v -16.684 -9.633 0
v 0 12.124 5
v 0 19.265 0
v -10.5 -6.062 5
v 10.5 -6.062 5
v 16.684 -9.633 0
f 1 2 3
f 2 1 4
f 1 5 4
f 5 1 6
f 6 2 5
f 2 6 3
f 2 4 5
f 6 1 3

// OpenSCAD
// file: dice_mold_base_generator.scad
module triangle_centered_at_incenter(s=13.76, h=0) {
    b = s / sqrt(2);
    points = [for (i = [90, 90 + 120, 90-120]) [cos(i) * b, sin(i) * b]];
    polygon(points);
}



module polygon_centered_at_incenter(s=13.76, n=3, h=5, slope=30) {
    incenter_angle = 360 / n;
    end = n - 1;
    angles = [for (i = [0:end]) (90 + incenter_angle * i)];
    angles_sum = 180 + (n - 3) * 180;
    vertex_angle = angles_sum / n;
    r = 0.5 * s / cos(vertex_angle / 2);
    points = [for (i = angles) [cos(i) * r, sin(i) * r]];
    bigger_r = r + (cos(slope) * (h / sin(slope)));
    bigger_points = [for (i = angles) [cos(i) * bigger_r, sin(i) * bigger_r]];
        
//    polygon(points);
    
//    polygon(bigger_points);
    
    points3d = [for (i = [0:end]) [points[i][0], points[i][1], h]];
    bigger_points3d = [for (i = [0:end]) [bigger_points[i][0], bigger_points[i][1], 0]];
    
    all_points = concat(points3d, bigger_points3d);
//    points = concat(points, [points[0]]);
//    bigger_points = concat(bigger_points, [bigger_points[0]]);
    
    num_points = len(points3d);
    faces = concat([for (i=[0:end]) [i, (i + 1) % n, num_points + (i + 1) % n, num_points + i]], [[for (i = [0:end]) num_points - 1 - i]], [[for (i = [0:end]) num_points + i ]]);
//    echo(points3d);
//    echo(bigger_points3d);
//    echo(all_points);
//    echo(faces);
        
    polyhedron(points=all_points, faces=faces);
}

module generate_d10(bottom_diff=3.8, diameter=17.37, height=29.03) {
    radius = 0.5 * diameter;
    center_angle = 36;
    angles1 = [for (i = [0:4]) (90 + center_angle * i * 2)];
    angles2 = [for (i = angles1) (i + center_angle)];
//    points = [for (i = [0
    points1 = [for (i = angles1) [cos(i) * radius, sin(i) * radius]];
    points2 = [for (i = angles2) [cos(i) * radius, sin(i) * radius]];
    
//    polygon(points1);
//    #polygon(points2);
    
    diff = bottom_diff * 0.5;
    points1_3d = [for (p = points1) [p[0], p[1], diff]];
    points2_3d = [for (p = points2) [p[0], p[1], -diff]];
    
    h2 = height * 0.5;
    top_point = [0, 0, h2];
    bottom_point = [0, 0, -h2];
    all_points = concat(points1_3d, points2_3d, [top_point], [bottom_point]);
    lall = len(all_points);
    t = lall - 2;
    b = lall - 1;
    
    plen = len(points1_3d);
    faces1 = [for (i = [0:plen - 1]) [t, i, plen + i, (i + 1) % plen]];
    faces2 = [for (i = [0:plen-1]) [b, plen + (i + 1) % plen, (i + 1) % plen, plen + i]];
    echo(faces1[2]);
    echo(all_points);
    
    polyhedron(points=all_points, faces=[for (i = [2:2]) faces1[i]]);
//    polyhedron(points=all_points, faces=concat(faces1, faces2));
}

function polar_x(r=5, theta=0) = cos(theta) * r;
function polar_y(r=5, theta=0) = sin(theta) * r;
function oval_x(r1, a, theta) = cos(theta) * (r1 + a * abs(cos(theta)));
function oval_y(r1, a, theta) = sin(theta) * (r1 + a * abs(cos(theta)));
module d10_base(s1=16, s2=6.5, l=18.4, h=5, slope=35) {
    p = (s1 + s2 + l) / 2;
    s3 = 2 * sqrt(p * (p - s1) * (p - s2) * (p - l)) / l;
    h1 = sqrt(s1 * s1 - s3 * s3);
    h2 = sqrt(s2 * s2 - s3 * s3);
    l_half = l / 2;
    above = l_half - h1;
//    diamond = [[0, l_half], [-s3, above], [0, -l_half], [s3, above]];
    
    base_diff = (cos(slope) * (h / sin(slope)));
    
    th1 = atan2(above, s3);
    th2 = atan2(above, -s3);
    small_r = sqrt(s3 * s3 + above * above);
    base_r = small_r + base_diff;
    top_r = l_half;
    angles = [90, th2, 270, th1];
    a_top = (small_r - top_r) / abs(cos(th1));
    base_small_r = sqrt(pow(cos(th2) * base_r, 2) + pow(sin(th2) * base_r, 2));
    a_bot = (base_small_r - (l_half + base_diff)) / abs(cos(th1));
    diamond = [for (t = angles) [oval_x(top_r, a_top, t), oval_y(top_r, a_top, t)]];
    base_points = [for (t = angles) [oval_x(base_r, a_bot, t), oval_y(base_r, a_bot, t)]];
//    polygon(points=diamond);
//    #polygon(points=diamond);
    
    
    
//    base_points = [[0, l_half + base_diff], [cos(th2) * base_r, sin(th2) * base_r], [0, -l_half - base_diff], [cos(th1) * base_r, sin(th1) * base_r]];
//    polygon(points=base_points);
//    base_points = [[0, l_half + base_diff], [-s3 - base_diff, above], [0, -l_half - base_diff], [s3 + base_diff, above]];
//    polygon(points=diamond);
    
    diamond_points3d = [for (i = diamond) [i[0], i[1], 5]];
    base_points3d = [for (i = base_points) [i[0], i[1], 0]];
    all_points = concat(diamond_points3d, base_points3d);
    
    faces = concat([for (i=[0:3]) [i, (i + 1)% 4, 4 + (i + 1)% 4, 4 + i]],
                   [[0, 3, 2, 1]],
                   [[4, 5, 6, 7]]);
    echo("Points", all_points);
    echo("Faces", faces);
    polyhedron(points=all_points, faces=faces); //[for (i=[0:3]) [i, (i + 1)% 4, 4 + (i + 1)% 4, 4 + i]]);
    
//    #polygon(points=base_points);
}


//intersection() {
//translate([0, 0, -5]) rotate([0, 0, 18]) cylinder(h=10, r1=10, r2=0, $fn=5);
//rotate([0, 0, 36 + 18]) translate([0, 0, 5]) rotate([180, 0, 0]) cylinder(h=10, r1=10, r2=0, $fn=5);
//}

////generate_d10(bottom_diff=3.8, diameter=25);

//polyhedron(points=[
//    [0, 12.5, 1.9], // 0
//    [-11.8882, 3.86271, 1.9], // 1
//    [-7.34732, -10.1127, 1.9], // 2
//    [7.34732, -10.1127, 1.9], // 3
//    [11.8882, 3.86271, 1.9], // 4
//    [-7.34732, 10.1127, -1.9], // 5
//    [-11.8882, -3.86271, -1.9], // 6
//    [0, -12.5, -1.9], // 7
//    [11.8882, -3.86271, -1.9], // 8
//    [7.34732, 10.1127, -1.9], // 9
//    [0, 0, 14.515], // 10
//    [0, 0, -14.515]], // 11
//    faces=[[10, 2, 7, 3]]);
//    

//polygon_centered_at_incenter(s=10, n=5, h=5);

// For D4
//translate([-50, 0, 0]) polygon_centered_at_incenter(s=21, n=3, h=5, slope=35);

// For D6
//translate([-30, 20, 0]) polygon_centered_at_incenter(s=13, n=4, h=5, slope=35);

// For D8
//translate([50, 0, 0]) polygon_centered_at_incenter(s=15, n=3, h=5, slope=35);

// For D10
//d10_base();
//translate([0, 0, 0]) polygon_centered_at_incenter(s=15, n=3, h=5, slope=35);

// For D12
//translate([0, -40, 0]) polygon_centered_at_incenter(s=6.5, n=5, h=5, slope=35);

// For D20
//translate([20, 20, 0]) polygon_centered_at_incenter(s=8.7, n=3, h=5, slope=35);

//#triangle_centered_at_incenter();
// main file
use <dice_mold_base_generator.scad>;

polygon_centered_at_incenter(s=21, n=3, h=5, slope=35);
